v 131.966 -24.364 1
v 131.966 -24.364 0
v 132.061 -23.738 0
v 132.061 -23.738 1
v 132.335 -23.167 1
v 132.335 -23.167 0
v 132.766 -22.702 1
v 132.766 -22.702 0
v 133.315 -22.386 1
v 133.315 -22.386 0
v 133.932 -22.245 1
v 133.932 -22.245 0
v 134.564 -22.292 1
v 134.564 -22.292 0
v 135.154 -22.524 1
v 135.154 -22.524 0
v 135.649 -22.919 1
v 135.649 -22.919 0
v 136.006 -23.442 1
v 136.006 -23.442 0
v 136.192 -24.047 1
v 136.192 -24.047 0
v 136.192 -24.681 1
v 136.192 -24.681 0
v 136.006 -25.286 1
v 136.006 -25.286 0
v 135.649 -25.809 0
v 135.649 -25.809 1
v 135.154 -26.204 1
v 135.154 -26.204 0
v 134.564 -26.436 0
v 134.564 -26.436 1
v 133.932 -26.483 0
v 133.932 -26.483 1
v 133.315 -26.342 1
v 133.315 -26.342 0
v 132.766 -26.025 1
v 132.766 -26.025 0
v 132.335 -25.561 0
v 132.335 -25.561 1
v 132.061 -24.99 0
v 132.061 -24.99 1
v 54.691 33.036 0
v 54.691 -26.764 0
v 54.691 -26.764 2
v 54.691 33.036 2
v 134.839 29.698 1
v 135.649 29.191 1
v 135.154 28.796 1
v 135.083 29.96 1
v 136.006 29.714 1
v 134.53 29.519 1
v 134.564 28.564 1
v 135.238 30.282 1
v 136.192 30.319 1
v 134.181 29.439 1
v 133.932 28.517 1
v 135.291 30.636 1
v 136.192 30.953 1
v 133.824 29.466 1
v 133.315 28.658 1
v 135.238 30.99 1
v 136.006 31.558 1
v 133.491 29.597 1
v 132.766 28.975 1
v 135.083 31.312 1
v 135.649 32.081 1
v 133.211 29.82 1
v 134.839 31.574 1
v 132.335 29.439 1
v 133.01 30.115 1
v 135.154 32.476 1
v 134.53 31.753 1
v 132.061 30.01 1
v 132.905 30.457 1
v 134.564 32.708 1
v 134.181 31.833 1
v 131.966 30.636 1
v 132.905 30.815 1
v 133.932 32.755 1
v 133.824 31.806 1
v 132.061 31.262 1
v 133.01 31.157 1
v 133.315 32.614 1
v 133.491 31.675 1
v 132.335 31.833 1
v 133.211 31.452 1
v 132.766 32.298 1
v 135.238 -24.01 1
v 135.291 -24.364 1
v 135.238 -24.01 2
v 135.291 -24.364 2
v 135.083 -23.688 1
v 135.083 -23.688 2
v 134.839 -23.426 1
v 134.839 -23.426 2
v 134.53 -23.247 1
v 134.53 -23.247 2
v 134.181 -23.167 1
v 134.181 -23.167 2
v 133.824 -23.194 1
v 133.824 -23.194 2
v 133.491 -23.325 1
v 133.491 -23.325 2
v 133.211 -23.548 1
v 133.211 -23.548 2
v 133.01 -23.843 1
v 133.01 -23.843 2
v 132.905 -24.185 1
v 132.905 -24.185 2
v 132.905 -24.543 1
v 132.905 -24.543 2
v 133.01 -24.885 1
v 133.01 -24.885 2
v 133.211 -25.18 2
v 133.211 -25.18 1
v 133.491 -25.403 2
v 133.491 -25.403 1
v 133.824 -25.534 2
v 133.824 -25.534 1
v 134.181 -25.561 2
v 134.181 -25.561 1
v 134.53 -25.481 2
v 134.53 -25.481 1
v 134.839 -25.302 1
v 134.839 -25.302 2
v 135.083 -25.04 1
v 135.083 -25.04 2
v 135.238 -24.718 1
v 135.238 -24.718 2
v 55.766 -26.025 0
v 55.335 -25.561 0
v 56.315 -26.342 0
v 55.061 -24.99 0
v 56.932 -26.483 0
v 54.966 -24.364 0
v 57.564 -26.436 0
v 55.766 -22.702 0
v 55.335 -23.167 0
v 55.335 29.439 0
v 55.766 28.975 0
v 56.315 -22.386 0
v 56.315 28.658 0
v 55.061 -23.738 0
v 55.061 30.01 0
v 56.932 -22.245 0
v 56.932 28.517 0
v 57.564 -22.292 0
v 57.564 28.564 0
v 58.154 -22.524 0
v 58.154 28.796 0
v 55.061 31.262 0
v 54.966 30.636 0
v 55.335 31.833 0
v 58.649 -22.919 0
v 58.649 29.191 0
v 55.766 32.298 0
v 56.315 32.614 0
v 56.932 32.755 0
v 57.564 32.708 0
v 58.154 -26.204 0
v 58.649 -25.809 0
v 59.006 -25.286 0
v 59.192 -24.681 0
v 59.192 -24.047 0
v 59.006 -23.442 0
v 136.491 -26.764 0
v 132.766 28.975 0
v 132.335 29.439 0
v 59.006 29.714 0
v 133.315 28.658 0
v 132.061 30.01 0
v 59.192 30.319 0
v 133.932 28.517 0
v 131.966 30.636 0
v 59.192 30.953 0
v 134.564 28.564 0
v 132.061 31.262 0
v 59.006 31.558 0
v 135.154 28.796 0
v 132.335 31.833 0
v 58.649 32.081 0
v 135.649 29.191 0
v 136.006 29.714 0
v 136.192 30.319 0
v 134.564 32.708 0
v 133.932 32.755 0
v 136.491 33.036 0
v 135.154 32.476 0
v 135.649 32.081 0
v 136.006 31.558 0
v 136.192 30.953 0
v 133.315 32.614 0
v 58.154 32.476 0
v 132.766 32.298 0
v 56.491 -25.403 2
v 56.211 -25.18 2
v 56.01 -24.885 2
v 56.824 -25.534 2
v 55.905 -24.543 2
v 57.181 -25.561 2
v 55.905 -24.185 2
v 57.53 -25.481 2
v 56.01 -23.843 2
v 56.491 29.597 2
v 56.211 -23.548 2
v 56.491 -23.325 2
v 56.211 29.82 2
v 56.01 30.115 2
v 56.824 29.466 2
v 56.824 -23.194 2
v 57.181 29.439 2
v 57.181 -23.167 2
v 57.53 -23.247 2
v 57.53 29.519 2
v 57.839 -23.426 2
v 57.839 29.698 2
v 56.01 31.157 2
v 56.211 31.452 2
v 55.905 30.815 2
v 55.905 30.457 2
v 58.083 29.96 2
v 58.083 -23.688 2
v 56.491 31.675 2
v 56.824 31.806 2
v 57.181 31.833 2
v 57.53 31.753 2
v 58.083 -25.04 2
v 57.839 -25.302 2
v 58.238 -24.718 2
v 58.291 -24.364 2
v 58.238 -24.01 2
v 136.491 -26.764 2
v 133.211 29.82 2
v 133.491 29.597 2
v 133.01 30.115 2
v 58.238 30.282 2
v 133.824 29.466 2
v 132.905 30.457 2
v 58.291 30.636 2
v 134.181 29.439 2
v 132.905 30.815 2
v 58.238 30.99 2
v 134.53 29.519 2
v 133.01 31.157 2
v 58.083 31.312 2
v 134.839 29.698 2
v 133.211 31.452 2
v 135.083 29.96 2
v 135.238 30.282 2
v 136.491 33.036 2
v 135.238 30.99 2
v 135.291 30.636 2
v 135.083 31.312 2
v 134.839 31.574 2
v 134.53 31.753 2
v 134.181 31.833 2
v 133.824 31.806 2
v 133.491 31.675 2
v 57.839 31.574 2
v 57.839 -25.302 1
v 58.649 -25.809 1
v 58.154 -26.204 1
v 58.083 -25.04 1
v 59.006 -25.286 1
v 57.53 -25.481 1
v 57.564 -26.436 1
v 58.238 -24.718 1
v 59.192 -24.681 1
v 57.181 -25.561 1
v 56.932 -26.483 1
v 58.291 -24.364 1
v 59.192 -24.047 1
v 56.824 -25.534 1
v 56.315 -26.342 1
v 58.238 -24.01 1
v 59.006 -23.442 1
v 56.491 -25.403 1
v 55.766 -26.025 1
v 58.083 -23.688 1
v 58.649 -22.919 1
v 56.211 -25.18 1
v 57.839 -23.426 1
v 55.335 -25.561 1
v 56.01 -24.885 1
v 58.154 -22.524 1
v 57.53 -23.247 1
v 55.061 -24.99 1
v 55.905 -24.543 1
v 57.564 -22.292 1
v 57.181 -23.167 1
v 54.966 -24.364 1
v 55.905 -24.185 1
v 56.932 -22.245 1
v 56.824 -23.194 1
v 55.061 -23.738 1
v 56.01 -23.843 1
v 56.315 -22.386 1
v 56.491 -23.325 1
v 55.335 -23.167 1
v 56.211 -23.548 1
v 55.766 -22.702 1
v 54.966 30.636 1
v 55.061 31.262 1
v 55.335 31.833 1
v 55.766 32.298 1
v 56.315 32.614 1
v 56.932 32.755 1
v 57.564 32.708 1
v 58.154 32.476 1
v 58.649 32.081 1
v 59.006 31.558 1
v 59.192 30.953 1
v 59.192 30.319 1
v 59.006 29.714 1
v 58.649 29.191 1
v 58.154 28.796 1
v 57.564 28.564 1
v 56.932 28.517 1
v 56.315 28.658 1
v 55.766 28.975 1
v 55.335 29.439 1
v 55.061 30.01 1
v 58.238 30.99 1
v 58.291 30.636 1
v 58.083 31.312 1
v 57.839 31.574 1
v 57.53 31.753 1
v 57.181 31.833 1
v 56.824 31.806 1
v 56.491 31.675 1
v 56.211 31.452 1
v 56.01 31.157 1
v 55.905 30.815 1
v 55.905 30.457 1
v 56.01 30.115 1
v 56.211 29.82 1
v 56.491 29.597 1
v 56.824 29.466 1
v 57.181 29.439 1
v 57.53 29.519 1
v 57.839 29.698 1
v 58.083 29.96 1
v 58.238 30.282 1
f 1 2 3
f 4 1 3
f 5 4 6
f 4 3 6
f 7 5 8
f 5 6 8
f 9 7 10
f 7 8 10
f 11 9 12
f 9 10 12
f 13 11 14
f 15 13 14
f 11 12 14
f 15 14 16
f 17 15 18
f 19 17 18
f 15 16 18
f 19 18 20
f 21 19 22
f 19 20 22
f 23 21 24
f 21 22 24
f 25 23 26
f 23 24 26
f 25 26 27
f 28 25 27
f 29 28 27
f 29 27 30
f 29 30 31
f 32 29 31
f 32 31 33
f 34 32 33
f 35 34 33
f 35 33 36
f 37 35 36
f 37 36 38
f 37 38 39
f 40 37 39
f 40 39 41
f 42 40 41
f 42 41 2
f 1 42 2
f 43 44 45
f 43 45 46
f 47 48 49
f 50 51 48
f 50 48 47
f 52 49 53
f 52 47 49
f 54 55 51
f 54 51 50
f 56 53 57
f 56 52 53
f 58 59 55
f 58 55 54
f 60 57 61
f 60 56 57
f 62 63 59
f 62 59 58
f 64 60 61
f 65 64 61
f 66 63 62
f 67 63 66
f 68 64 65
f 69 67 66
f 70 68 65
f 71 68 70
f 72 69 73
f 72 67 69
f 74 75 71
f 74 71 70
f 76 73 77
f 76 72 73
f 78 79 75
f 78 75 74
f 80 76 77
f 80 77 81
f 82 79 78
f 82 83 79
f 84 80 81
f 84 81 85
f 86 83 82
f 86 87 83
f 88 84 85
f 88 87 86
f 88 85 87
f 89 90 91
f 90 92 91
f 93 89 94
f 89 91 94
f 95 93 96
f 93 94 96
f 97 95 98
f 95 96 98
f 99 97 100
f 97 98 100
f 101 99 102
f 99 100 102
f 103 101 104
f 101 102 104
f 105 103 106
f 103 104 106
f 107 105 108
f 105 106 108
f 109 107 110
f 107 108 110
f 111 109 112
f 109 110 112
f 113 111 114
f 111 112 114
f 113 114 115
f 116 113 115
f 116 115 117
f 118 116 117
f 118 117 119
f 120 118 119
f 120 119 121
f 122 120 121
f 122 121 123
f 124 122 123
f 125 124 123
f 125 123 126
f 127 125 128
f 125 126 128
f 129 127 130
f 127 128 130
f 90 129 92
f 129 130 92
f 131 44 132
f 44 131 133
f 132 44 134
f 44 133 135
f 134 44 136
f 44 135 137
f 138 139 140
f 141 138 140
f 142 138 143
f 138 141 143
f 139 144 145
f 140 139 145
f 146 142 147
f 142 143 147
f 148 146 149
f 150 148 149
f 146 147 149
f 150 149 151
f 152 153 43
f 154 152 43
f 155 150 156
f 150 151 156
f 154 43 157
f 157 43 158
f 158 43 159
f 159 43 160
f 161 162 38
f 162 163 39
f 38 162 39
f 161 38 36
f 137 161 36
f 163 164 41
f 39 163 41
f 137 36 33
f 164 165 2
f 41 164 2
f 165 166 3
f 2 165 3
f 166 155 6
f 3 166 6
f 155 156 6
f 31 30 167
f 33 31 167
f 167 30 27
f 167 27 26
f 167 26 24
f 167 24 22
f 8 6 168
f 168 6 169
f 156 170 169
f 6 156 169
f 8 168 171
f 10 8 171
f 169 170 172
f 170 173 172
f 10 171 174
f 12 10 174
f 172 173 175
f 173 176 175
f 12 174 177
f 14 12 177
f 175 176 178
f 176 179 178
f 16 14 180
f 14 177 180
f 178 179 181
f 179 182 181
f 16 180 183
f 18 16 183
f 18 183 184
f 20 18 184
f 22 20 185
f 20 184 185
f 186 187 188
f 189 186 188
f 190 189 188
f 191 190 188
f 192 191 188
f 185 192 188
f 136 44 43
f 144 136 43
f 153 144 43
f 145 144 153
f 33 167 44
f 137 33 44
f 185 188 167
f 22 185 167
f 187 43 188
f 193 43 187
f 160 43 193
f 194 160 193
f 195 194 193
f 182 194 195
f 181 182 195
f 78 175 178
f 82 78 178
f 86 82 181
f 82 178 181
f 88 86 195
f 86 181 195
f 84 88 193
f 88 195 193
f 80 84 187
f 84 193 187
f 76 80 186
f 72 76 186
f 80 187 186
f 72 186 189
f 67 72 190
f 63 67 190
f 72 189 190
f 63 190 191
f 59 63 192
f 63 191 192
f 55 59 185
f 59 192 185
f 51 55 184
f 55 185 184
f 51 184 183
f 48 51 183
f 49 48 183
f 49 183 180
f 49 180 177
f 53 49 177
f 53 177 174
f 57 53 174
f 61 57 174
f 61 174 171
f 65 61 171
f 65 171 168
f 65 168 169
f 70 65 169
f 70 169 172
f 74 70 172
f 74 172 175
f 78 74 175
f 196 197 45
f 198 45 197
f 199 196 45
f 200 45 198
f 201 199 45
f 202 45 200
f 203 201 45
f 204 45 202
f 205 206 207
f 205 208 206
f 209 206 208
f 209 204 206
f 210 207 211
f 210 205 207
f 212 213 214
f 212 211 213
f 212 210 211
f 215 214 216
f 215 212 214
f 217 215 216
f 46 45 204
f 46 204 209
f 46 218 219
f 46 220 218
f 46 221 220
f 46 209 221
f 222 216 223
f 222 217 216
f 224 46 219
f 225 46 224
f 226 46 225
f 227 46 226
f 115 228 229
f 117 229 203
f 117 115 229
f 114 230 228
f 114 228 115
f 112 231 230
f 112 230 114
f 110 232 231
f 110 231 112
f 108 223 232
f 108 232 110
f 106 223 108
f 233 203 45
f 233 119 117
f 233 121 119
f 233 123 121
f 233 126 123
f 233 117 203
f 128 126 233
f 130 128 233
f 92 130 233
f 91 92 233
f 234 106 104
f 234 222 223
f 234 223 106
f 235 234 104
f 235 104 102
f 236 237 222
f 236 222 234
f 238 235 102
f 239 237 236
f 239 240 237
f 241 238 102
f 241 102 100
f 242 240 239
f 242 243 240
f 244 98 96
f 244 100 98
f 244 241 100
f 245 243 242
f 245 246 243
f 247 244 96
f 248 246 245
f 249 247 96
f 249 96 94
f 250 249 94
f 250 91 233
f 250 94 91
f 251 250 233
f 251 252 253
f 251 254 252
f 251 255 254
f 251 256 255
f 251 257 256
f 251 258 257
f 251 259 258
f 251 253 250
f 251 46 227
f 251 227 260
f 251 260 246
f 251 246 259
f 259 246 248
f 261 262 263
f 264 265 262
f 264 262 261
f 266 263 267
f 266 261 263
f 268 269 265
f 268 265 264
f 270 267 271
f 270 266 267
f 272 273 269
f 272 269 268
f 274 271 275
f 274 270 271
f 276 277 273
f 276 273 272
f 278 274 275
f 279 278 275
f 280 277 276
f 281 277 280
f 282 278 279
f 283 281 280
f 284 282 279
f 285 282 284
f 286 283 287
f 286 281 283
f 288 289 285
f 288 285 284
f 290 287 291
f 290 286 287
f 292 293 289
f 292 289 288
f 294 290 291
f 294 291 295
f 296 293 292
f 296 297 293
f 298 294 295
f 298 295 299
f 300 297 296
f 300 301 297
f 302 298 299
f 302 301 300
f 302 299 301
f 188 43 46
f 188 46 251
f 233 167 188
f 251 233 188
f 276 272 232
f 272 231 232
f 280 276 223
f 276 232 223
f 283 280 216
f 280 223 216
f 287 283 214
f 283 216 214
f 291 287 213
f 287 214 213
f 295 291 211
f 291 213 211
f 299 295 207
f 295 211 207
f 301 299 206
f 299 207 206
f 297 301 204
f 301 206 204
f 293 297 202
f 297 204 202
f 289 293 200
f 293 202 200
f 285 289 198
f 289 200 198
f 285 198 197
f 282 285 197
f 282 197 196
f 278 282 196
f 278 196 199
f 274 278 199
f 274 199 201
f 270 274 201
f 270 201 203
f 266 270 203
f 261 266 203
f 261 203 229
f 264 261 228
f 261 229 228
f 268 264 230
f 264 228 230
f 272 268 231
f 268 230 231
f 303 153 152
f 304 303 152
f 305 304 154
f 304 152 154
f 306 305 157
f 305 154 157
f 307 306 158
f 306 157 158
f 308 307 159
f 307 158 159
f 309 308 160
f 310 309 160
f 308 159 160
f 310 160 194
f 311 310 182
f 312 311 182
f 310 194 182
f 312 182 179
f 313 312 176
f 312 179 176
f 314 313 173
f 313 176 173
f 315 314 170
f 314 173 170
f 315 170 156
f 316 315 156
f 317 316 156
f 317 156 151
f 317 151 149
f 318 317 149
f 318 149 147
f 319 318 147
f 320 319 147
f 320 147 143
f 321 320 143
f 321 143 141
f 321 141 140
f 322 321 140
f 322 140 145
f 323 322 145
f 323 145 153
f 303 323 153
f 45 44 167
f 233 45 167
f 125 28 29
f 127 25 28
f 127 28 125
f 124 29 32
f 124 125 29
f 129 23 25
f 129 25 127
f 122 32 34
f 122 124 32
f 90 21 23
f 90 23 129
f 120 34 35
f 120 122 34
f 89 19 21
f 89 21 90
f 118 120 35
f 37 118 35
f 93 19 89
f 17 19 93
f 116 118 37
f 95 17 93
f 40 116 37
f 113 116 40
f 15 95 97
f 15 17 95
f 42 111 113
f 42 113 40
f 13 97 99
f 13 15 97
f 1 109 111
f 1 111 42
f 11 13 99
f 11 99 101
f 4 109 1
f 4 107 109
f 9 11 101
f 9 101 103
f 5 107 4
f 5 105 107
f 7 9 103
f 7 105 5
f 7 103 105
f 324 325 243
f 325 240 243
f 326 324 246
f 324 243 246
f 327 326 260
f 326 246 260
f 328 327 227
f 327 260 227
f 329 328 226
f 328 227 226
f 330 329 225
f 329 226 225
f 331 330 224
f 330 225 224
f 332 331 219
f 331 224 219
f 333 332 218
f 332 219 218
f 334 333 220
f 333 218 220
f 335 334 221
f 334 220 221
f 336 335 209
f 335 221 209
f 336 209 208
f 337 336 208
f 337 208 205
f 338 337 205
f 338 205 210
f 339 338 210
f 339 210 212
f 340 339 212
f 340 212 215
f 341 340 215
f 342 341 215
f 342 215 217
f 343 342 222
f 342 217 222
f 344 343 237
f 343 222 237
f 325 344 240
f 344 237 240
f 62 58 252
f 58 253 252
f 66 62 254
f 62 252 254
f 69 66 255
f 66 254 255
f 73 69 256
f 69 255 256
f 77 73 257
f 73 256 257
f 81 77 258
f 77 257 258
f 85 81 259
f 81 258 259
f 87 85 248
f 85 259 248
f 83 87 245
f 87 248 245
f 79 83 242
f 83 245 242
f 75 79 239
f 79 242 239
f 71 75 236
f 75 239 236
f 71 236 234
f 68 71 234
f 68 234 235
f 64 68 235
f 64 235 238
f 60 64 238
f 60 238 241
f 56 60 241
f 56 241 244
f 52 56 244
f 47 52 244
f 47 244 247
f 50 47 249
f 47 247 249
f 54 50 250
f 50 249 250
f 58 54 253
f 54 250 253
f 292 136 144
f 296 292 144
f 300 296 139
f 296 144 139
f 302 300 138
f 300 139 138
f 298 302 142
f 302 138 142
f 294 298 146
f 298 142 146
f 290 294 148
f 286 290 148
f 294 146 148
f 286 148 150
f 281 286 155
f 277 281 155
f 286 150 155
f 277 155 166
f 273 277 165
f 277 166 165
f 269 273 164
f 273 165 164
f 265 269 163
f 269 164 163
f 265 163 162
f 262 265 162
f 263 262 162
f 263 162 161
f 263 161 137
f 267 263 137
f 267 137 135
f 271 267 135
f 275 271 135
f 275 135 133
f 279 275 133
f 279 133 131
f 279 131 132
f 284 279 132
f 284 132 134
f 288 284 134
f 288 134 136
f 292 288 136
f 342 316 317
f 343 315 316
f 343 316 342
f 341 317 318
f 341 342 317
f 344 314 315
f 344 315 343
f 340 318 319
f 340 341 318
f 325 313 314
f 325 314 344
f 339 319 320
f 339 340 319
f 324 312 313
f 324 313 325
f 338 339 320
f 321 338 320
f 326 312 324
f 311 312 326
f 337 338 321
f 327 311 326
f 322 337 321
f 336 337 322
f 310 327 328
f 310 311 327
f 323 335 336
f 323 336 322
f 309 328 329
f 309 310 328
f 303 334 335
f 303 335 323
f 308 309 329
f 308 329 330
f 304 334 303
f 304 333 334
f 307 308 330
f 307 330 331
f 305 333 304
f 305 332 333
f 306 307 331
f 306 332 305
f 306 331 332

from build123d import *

# Parameters (mm, degrees)
SKETCH1_W                                        = 81.8
SKETCH1_H                                        = 59.8
BOSS_EXTRUDE1_DEPTH                              = 2
CBORE_FOR_M2_PAN_HEAD_MACHINE_SCREW1_D           = 2.4
CBORE_FOR_M2_PAN_HEAD_MACHINE_SCREW1_DEPTH       = 6
CBORE_FOR_M2_PAN_HEAD_MACHINE_SCREW1_CBORE_D     = 4.25
CBORE_FOR_M2_PAN_HEAD_MACHINE_SCREW1_CBORE_DEPTH = 1
CBORE_FOR_M2_PAN_HEAD_MACHINE_SCREW1_TIP         = 0.721032743


with BuildPart() as part:
    # Sketch1 → Boss-Extrude1 (new body)
    with BuildSketch(Plane.XY):
        with Locations((95.591153219, 3.136127214)):
            Rectangle(SKETCH1_W, SKETCH1_H)
    extrude(amount=BOSS_EXTRUDE1_DEPTH)

    # CBORE for M2 Pan Head Machine Screw1
    with Locations(Plane(origin=(0, 0, 0), x_dir=(-1, 0, 0), z_dir=(0, 0, -1))):
        with Locations((-57.091153219, 30.636127214), (-134.091153219, 30.636127214), (-57.091153219, -24.363872786), (-134.091153219, -24.363872786)):
            CounterBoreHole(CBORE_FOR_M2_PAN_HEAD_MACHINE_SCREW1_D / 2, CBORE_FOR_M2_PAN_HEAD_MACHINE_SCREW1_CBORE_D / 2, CBORE_FOR_M2_PAN_HEAD_MACHINE_SCREW1_CBORE_DEPTH, depth=CBORE_FOR_M2_PAN_HEAD_MACHINE_SCREW1_DEPTH)
            with Locations((0, 0, -(CBORE_FOR_M2_PAN_HEAD_MACHINE_SCREW1_DEPTH + CBORE_FOR_M2_PAN_HEAD_MACHINE_SCREW1_TIP / 2))):  # 118° drill point
                Cone(0, CBORE_FOR_M2_PAN_HEAD_MACHINE_SCREW1_D / 2, CBORE_FOR_M2_PAN_HEAD_MACHINE_SCREW1_TIP, mode=Mode.SUBTRACT)


solid = part.part
